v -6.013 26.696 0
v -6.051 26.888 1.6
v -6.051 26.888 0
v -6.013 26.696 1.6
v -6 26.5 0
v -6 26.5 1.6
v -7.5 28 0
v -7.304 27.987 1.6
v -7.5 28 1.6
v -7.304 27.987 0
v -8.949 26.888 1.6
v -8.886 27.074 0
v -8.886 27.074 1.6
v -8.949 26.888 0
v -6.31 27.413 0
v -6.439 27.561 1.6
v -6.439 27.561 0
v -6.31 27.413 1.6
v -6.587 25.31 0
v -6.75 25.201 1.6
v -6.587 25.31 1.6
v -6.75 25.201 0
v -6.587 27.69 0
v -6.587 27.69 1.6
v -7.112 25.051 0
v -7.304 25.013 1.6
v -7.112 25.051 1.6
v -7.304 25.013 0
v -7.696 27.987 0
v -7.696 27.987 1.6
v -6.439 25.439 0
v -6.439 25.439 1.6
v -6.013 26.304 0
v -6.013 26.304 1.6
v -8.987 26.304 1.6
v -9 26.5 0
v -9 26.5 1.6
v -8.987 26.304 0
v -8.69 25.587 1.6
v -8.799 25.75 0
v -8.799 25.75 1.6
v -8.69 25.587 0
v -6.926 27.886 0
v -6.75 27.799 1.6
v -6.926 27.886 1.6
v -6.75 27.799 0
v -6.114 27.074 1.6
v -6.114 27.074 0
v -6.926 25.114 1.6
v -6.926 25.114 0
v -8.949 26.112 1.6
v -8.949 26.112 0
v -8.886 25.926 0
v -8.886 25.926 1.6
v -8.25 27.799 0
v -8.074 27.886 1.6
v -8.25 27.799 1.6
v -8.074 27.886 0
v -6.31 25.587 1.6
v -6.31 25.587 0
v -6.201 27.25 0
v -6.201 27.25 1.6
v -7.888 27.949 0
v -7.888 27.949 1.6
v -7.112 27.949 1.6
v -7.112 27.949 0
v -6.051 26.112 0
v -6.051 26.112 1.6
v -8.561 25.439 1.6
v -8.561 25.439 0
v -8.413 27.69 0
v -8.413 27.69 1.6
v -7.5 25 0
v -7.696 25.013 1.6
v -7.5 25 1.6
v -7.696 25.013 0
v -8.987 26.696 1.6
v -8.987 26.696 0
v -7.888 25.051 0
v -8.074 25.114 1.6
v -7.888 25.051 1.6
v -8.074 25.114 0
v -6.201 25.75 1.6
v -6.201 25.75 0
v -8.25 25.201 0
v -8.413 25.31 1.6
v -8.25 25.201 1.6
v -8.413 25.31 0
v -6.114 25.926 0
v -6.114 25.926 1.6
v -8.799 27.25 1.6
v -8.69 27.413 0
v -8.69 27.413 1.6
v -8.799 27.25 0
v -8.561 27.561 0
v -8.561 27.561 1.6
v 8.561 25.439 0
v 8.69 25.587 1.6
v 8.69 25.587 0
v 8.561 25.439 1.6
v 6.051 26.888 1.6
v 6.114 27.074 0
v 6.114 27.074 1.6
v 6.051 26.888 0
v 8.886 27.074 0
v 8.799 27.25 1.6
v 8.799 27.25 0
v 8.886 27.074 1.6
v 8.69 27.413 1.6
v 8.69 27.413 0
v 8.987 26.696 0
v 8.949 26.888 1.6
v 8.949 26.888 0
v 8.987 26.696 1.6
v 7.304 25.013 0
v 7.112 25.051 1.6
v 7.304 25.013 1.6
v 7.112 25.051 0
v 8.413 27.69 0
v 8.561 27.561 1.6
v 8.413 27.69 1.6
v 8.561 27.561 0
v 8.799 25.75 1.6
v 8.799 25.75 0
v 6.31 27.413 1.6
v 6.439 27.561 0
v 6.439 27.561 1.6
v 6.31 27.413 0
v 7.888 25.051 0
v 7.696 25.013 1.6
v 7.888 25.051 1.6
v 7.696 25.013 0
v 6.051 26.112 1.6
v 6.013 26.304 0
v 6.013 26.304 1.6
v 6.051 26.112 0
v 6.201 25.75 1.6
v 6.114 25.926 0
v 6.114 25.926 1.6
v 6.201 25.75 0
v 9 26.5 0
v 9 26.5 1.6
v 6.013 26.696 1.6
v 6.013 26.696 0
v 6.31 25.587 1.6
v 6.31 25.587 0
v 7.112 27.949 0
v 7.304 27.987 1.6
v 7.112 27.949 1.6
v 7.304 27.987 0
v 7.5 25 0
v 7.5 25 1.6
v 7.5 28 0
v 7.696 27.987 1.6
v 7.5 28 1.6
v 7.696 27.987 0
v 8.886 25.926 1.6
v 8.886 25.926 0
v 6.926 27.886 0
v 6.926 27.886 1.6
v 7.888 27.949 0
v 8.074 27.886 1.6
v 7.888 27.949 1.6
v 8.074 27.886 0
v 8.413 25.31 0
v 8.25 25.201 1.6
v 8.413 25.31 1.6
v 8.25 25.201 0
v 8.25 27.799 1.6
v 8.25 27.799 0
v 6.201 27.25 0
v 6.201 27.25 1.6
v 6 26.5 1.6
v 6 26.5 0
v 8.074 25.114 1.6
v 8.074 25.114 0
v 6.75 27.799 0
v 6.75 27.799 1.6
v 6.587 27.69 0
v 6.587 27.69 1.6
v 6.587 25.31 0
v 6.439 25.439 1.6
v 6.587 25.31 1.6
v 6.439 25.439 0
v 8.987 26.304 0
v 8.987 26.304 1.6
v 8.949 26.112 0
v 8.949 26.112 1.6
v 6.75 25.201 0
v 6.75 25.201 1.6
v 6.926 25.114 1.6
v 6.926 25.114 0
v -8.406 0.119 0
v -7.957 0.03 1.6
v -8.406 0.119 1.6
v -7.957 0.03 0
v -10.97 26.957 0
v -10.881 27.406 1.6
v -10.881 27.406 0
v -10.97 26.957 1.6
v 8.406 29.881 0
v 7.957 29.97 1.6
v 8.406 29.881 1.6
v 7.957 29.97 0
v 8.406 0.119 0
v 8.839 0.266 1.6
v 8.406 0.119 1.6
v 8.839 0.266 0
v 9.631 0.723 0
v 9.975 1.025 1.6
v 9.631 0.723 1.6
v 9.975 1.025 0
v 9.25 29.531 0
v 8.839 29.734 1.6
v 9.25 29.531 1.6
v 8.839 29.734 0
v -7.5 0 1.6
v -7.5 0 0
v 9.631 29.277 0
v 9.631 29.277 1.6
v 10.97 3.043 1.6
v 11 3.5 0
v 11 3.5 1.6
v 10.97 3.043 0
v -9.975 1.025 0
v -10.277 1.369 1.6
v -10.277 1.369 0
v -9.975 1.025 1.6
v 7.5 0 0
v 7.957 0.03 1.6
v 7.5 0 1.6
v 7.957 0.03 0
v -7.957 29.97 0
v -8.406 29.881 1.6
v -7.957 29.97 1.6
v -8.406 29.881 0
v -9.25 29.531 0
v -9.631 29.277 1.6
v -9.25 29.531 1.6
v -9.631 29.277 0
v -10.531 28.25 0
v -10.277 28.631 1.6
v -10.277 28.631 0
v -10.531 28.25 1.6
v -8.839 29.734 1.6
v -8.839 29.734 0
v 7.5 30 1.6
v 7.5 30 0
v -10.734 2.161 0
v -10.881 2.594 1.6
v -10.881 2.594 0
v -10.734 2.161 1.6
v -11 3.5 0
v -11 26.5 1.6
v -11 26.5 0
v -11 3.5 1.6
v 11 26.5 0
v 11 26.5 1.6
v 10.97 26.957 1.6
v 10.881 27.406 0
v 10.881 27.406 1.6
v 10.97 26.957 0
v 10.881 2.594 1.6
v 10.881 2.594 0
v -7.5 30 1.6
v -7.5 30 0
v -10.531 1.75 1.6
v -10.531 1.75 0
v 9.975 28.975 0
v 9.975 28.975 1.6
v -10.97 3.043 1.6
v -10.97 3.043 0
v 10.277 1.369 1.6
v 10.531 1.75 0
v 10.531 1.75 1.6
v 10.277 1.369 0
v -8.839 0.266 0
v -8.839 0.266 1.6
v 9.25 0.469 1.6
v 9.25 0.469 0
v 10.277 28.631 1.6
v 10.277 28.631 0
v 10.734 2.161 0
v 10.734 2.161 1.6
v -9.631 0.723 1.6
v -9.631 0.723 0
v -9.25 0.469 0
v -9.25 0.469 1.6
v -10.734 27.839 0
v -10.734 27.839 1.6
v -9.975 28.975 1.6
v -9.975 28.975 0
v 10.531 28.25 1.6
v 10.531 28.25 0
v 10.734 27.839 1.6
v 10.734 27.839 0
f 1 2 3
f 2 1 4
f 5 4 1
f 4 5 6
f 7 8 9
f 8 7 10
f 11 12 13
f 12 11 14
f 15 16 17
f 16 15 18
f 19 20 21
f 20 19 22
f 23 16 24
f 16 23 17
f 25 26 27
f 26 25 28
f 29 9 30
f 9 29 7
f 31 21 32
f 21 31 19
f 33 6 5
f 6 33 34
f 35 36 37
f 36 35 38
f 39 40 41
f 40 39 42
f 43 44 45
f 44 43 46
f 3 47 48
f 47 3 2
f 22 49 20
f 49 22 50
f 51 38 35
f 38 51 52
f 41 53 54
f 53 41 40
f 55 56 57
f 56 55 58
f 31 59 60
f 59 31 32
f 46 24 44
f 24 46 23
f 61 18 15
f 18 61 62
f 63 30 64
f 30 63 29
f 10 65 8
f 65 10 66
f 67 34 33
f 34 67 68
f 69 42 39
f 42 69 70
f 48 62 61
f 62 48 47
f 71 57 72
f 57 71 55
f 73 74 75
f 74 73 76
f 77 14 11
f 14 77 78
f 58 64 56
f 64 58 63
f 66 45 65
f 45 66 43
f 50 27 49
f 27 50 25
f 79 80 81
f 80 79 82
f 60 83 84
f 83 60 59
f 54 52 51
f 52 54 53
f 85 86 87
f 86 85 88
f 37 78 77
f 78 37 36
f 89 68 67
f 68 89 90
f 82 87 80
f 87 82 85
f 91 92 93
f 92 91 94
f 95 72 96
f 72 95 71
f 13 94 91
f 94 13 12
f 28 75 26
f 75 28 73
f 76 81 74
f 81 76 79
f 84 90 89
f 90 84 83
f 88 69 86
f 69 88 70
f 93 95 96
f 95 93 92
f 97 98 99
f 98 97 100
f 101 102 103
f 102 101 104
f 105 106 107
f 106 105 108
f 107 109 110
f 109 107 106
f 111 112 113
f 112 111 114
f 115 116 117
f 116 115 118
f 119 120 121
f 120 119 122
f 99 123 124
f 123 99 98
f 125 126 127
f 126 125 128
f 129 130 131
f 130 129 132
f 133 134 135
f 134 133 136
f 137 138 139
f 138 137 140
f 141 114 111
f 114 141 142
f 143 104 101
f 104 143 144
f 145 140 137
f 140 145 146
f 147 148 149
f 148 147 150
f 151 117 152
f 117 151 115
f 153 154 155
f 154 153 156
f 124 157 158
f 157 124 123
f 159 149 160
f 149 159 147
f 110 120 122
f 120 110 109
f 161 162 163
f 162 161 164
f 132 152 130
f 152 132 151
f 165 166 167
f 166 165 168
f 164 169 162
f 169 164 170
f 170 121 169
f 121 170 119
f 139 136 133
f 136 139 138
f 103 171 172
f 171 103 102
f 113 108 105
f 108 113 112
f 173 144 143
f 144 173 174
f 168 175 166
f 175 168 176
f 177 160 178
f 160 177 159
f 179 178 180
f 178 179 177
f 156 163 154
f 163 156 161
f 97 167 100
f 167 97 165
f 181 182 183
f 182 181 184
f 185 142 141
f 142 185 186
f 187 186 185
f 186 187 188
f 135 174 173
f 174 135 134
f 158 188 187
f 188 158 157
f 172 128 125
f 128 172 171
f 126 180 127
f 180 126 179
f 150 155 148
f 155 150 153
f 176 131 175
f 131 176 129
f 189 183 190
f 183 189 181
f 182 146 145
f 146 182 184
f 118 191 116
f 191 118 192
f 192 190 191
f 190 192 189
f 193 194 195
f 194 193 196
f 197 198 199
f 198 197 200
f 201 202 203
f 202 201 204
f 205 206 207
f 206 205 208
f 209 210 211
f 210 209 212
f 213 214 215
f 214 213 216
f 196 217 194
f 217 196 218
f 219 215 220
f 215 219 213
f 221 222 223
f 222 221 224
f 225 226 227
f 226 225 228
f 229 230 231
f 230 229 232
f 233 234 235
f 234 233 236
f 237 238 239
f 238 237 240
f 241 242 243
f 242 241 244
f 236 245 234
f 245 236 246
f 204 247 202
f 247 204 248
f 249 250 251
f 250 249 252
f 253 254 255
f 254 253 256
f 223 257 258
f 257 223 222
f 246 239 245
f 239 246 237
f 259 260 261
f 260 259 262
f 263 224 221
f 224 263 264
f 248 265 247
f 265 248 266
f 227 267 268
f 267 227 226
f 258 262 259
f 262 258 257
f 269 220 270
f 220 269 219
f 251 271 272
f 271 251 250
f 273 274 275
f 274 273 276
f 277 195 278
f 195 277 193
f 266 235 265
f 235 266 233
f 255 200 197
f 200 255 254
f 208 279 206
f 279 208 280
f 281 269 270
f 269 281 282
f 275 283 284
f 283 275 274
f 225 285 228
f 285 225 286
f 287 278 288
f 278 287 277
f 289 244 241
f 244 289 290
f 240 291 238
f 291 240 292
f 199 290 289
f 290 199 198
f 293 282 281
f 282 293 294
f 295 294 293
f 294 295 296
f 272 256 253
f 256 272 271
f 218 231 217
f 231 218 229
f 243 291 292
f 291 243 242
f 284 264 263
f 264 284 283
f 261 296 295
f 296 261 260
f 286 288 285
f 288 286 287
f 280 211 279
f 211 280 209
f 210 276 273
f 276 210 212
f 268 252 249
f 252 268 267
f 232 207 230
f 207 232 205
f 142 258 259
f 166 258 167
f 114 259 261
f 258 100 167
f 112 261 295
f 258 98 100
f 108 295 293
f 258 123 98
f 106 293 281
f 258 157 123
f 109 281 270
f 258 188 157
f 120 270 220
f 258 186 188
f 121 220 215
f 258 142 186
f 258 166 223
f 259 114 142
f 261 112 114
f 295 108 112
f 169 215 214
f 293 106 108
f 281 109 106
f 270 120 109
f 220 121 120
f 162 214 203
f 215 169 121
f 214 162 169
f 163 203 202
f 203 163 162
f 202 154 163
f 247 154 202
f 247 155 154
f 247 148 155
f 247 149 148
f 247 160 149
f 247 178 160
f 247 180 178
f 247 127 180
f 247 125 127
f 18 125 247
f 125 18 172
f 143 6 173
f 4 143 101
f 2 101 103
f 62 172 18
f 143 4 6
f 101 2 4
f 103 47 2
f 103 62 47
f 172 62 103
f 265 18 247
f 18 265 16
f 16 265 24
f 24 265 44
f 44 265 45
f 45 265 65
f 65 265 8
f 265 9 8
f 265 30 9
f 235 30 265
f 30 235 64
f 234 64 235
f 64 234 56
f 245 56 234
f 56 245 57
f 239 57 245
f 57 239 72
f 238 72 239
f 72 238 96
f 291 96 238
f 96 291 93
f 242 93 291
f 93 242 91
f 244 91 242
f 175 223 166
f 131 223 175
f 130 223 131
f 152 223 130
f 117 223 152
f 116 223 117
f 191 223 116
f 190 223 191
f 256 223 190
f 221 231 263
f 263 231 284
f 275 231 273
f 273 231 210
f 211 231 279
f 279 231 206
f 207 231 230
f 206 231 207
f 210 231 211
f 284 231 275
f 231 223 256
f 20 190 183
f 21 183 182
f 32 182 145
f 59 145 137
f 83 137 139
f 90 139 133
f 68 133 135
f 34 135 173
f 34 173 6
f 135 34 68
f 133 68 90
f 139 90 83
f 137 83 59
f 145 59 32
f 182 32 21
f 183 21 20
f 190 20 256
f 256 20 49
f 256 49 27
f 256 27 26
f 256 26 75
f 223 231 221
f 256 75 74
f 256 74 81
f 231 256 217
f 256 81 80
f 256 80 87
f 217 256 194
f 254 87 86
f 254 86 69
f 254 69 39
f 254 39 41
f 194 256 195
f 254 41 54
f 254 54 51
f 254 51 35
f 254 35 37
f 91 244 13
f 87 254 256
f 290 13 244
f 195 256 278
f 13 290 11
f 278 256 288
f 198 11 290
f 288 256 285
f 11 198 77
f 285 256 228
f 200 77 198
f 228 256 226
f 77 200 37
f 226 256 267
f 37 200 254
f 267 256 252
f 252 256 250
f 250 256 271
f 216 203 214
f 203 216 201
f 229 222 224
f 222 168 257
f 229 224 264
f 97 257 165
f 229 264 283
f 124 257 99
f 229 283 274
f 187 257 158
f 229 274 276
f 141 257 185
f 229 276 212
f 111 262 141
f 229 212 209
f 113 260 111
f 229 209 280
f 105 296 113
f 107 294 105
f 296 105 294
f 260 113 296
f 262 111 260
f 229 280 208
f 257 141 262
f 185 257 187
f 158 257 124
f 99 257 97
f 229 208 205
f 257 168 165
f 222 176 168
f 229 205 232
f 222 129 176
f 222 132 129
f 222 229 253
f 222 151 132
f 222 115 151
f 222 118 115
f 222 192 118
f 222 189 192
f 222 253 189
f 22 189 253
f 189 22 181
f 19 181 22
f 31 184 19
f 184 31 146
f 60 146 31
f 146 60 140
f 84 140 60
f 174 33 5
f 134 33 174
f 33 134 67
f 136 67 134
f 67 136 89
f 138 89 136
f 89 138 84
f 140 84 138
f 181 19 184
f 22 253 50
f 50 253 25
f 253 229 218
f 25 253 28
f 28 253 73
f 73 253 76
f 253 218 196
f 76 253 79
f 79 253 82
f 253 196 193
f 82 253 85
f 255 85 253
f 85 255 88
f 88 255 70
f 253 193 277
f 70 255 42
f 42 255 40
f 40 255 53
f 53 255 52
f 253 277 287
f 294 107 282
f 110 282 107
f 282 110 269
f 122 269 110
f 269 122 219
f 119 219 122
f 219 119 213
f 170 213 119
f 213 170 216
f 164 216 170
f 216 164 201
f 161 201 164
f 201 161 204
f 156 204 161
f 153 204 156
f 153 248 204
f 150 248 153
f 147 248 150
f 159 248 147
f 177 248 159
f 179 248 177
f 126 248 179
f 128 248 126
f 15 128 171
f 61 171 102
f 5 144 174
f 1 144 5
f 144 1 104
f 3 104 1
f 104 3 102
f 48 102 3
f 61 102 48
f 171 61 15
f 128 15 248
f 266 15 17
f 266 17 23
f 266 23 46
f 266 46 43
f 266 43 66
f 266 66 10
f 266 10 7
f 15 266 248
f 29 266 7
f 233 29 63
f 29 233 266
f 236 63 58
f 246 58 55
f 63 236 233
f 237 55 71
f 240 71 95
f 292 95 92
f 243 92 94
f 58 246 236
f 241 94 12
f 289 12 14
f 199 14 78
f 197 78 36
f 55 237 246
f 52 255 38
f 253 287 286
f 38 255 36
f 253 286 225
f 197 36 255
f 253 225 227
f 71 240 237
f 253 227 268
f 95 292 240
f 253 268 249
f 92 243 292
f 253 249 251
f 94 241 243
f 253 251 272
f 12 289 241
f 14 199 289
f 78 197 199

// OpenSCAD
// SPDX-License-Identifier: CC0-1.0. Original dimension-informed reference, not vendor CAD.
// Origin midway across connector-side edge at PCB underside; units mm.
$fn=48; part="pcb"; pcb=1.6;
module opening(){for(x=[-7.5,7.5]) translate([x,26.5,-1]) cylinder(d=3,h=5);}
module board(){difference(){hull() for(x=[-7.5,7.5],y=[3.5,26.5]) translate([x,y,0]) cylinder(r=3.5,h=pcb); opening();}}
module transducer(){translate([0,19,pcb]) difference(){cylinder(r=5.95,h=8.9); translate([0,0,7.5]) cylinder(r=1.5,h=2);}}
module socket(){difference(){translate([-4,0,pcb]) cube([8,5.4,5.9]); translate([-3.36,-.01,pcb+1.15]) cube([6.72,4.65,4.05]);translate([-1.72,-.01,pcb+4.8]) cube([3.44,3.05,1.3]);}}
module conductive(){for(x=[-7.5,7.5]) translate([x,26.5,pcb]) difference(){cylinder(d=5.8,h=.14);translate([0,0,-.01]) cylinder(d=3,h=.2);} for(x=[-2,0,2]) translate([x-.22,.65,pcb+2.4]) cube([.44,4.1,.44]); for(v=[[-6,9],[6,9.8],[-3.5,12.2]]) for(a=[-1,1]) translate([v[0]+a*.73-.3,v[1]-.49,pcb]) cube([.6,.98,.47]); for(v=[[6.2,15.1],[6.2,17],[9.1,16.05]]) translate([v[0]-.55,v[1]-.23,pcb]) cube([1.1,.46,.4]);}
module electronics(){for(v=[[-6,9],[6,9.8],[-3.5,12.2]]) translate([v[0]-.56,v[1]-.49,pcb]) cube([1.12,.98,.53]); translate([6.73,14.55,pcb]) cube([2.0,3.0,1.15]);}
if(part=="pcb") board(); if(part=="buzzer") transducer(); if(part=="socket") socket(); if(part=="metal") conductive(); if(part=="electronics") electronics();
